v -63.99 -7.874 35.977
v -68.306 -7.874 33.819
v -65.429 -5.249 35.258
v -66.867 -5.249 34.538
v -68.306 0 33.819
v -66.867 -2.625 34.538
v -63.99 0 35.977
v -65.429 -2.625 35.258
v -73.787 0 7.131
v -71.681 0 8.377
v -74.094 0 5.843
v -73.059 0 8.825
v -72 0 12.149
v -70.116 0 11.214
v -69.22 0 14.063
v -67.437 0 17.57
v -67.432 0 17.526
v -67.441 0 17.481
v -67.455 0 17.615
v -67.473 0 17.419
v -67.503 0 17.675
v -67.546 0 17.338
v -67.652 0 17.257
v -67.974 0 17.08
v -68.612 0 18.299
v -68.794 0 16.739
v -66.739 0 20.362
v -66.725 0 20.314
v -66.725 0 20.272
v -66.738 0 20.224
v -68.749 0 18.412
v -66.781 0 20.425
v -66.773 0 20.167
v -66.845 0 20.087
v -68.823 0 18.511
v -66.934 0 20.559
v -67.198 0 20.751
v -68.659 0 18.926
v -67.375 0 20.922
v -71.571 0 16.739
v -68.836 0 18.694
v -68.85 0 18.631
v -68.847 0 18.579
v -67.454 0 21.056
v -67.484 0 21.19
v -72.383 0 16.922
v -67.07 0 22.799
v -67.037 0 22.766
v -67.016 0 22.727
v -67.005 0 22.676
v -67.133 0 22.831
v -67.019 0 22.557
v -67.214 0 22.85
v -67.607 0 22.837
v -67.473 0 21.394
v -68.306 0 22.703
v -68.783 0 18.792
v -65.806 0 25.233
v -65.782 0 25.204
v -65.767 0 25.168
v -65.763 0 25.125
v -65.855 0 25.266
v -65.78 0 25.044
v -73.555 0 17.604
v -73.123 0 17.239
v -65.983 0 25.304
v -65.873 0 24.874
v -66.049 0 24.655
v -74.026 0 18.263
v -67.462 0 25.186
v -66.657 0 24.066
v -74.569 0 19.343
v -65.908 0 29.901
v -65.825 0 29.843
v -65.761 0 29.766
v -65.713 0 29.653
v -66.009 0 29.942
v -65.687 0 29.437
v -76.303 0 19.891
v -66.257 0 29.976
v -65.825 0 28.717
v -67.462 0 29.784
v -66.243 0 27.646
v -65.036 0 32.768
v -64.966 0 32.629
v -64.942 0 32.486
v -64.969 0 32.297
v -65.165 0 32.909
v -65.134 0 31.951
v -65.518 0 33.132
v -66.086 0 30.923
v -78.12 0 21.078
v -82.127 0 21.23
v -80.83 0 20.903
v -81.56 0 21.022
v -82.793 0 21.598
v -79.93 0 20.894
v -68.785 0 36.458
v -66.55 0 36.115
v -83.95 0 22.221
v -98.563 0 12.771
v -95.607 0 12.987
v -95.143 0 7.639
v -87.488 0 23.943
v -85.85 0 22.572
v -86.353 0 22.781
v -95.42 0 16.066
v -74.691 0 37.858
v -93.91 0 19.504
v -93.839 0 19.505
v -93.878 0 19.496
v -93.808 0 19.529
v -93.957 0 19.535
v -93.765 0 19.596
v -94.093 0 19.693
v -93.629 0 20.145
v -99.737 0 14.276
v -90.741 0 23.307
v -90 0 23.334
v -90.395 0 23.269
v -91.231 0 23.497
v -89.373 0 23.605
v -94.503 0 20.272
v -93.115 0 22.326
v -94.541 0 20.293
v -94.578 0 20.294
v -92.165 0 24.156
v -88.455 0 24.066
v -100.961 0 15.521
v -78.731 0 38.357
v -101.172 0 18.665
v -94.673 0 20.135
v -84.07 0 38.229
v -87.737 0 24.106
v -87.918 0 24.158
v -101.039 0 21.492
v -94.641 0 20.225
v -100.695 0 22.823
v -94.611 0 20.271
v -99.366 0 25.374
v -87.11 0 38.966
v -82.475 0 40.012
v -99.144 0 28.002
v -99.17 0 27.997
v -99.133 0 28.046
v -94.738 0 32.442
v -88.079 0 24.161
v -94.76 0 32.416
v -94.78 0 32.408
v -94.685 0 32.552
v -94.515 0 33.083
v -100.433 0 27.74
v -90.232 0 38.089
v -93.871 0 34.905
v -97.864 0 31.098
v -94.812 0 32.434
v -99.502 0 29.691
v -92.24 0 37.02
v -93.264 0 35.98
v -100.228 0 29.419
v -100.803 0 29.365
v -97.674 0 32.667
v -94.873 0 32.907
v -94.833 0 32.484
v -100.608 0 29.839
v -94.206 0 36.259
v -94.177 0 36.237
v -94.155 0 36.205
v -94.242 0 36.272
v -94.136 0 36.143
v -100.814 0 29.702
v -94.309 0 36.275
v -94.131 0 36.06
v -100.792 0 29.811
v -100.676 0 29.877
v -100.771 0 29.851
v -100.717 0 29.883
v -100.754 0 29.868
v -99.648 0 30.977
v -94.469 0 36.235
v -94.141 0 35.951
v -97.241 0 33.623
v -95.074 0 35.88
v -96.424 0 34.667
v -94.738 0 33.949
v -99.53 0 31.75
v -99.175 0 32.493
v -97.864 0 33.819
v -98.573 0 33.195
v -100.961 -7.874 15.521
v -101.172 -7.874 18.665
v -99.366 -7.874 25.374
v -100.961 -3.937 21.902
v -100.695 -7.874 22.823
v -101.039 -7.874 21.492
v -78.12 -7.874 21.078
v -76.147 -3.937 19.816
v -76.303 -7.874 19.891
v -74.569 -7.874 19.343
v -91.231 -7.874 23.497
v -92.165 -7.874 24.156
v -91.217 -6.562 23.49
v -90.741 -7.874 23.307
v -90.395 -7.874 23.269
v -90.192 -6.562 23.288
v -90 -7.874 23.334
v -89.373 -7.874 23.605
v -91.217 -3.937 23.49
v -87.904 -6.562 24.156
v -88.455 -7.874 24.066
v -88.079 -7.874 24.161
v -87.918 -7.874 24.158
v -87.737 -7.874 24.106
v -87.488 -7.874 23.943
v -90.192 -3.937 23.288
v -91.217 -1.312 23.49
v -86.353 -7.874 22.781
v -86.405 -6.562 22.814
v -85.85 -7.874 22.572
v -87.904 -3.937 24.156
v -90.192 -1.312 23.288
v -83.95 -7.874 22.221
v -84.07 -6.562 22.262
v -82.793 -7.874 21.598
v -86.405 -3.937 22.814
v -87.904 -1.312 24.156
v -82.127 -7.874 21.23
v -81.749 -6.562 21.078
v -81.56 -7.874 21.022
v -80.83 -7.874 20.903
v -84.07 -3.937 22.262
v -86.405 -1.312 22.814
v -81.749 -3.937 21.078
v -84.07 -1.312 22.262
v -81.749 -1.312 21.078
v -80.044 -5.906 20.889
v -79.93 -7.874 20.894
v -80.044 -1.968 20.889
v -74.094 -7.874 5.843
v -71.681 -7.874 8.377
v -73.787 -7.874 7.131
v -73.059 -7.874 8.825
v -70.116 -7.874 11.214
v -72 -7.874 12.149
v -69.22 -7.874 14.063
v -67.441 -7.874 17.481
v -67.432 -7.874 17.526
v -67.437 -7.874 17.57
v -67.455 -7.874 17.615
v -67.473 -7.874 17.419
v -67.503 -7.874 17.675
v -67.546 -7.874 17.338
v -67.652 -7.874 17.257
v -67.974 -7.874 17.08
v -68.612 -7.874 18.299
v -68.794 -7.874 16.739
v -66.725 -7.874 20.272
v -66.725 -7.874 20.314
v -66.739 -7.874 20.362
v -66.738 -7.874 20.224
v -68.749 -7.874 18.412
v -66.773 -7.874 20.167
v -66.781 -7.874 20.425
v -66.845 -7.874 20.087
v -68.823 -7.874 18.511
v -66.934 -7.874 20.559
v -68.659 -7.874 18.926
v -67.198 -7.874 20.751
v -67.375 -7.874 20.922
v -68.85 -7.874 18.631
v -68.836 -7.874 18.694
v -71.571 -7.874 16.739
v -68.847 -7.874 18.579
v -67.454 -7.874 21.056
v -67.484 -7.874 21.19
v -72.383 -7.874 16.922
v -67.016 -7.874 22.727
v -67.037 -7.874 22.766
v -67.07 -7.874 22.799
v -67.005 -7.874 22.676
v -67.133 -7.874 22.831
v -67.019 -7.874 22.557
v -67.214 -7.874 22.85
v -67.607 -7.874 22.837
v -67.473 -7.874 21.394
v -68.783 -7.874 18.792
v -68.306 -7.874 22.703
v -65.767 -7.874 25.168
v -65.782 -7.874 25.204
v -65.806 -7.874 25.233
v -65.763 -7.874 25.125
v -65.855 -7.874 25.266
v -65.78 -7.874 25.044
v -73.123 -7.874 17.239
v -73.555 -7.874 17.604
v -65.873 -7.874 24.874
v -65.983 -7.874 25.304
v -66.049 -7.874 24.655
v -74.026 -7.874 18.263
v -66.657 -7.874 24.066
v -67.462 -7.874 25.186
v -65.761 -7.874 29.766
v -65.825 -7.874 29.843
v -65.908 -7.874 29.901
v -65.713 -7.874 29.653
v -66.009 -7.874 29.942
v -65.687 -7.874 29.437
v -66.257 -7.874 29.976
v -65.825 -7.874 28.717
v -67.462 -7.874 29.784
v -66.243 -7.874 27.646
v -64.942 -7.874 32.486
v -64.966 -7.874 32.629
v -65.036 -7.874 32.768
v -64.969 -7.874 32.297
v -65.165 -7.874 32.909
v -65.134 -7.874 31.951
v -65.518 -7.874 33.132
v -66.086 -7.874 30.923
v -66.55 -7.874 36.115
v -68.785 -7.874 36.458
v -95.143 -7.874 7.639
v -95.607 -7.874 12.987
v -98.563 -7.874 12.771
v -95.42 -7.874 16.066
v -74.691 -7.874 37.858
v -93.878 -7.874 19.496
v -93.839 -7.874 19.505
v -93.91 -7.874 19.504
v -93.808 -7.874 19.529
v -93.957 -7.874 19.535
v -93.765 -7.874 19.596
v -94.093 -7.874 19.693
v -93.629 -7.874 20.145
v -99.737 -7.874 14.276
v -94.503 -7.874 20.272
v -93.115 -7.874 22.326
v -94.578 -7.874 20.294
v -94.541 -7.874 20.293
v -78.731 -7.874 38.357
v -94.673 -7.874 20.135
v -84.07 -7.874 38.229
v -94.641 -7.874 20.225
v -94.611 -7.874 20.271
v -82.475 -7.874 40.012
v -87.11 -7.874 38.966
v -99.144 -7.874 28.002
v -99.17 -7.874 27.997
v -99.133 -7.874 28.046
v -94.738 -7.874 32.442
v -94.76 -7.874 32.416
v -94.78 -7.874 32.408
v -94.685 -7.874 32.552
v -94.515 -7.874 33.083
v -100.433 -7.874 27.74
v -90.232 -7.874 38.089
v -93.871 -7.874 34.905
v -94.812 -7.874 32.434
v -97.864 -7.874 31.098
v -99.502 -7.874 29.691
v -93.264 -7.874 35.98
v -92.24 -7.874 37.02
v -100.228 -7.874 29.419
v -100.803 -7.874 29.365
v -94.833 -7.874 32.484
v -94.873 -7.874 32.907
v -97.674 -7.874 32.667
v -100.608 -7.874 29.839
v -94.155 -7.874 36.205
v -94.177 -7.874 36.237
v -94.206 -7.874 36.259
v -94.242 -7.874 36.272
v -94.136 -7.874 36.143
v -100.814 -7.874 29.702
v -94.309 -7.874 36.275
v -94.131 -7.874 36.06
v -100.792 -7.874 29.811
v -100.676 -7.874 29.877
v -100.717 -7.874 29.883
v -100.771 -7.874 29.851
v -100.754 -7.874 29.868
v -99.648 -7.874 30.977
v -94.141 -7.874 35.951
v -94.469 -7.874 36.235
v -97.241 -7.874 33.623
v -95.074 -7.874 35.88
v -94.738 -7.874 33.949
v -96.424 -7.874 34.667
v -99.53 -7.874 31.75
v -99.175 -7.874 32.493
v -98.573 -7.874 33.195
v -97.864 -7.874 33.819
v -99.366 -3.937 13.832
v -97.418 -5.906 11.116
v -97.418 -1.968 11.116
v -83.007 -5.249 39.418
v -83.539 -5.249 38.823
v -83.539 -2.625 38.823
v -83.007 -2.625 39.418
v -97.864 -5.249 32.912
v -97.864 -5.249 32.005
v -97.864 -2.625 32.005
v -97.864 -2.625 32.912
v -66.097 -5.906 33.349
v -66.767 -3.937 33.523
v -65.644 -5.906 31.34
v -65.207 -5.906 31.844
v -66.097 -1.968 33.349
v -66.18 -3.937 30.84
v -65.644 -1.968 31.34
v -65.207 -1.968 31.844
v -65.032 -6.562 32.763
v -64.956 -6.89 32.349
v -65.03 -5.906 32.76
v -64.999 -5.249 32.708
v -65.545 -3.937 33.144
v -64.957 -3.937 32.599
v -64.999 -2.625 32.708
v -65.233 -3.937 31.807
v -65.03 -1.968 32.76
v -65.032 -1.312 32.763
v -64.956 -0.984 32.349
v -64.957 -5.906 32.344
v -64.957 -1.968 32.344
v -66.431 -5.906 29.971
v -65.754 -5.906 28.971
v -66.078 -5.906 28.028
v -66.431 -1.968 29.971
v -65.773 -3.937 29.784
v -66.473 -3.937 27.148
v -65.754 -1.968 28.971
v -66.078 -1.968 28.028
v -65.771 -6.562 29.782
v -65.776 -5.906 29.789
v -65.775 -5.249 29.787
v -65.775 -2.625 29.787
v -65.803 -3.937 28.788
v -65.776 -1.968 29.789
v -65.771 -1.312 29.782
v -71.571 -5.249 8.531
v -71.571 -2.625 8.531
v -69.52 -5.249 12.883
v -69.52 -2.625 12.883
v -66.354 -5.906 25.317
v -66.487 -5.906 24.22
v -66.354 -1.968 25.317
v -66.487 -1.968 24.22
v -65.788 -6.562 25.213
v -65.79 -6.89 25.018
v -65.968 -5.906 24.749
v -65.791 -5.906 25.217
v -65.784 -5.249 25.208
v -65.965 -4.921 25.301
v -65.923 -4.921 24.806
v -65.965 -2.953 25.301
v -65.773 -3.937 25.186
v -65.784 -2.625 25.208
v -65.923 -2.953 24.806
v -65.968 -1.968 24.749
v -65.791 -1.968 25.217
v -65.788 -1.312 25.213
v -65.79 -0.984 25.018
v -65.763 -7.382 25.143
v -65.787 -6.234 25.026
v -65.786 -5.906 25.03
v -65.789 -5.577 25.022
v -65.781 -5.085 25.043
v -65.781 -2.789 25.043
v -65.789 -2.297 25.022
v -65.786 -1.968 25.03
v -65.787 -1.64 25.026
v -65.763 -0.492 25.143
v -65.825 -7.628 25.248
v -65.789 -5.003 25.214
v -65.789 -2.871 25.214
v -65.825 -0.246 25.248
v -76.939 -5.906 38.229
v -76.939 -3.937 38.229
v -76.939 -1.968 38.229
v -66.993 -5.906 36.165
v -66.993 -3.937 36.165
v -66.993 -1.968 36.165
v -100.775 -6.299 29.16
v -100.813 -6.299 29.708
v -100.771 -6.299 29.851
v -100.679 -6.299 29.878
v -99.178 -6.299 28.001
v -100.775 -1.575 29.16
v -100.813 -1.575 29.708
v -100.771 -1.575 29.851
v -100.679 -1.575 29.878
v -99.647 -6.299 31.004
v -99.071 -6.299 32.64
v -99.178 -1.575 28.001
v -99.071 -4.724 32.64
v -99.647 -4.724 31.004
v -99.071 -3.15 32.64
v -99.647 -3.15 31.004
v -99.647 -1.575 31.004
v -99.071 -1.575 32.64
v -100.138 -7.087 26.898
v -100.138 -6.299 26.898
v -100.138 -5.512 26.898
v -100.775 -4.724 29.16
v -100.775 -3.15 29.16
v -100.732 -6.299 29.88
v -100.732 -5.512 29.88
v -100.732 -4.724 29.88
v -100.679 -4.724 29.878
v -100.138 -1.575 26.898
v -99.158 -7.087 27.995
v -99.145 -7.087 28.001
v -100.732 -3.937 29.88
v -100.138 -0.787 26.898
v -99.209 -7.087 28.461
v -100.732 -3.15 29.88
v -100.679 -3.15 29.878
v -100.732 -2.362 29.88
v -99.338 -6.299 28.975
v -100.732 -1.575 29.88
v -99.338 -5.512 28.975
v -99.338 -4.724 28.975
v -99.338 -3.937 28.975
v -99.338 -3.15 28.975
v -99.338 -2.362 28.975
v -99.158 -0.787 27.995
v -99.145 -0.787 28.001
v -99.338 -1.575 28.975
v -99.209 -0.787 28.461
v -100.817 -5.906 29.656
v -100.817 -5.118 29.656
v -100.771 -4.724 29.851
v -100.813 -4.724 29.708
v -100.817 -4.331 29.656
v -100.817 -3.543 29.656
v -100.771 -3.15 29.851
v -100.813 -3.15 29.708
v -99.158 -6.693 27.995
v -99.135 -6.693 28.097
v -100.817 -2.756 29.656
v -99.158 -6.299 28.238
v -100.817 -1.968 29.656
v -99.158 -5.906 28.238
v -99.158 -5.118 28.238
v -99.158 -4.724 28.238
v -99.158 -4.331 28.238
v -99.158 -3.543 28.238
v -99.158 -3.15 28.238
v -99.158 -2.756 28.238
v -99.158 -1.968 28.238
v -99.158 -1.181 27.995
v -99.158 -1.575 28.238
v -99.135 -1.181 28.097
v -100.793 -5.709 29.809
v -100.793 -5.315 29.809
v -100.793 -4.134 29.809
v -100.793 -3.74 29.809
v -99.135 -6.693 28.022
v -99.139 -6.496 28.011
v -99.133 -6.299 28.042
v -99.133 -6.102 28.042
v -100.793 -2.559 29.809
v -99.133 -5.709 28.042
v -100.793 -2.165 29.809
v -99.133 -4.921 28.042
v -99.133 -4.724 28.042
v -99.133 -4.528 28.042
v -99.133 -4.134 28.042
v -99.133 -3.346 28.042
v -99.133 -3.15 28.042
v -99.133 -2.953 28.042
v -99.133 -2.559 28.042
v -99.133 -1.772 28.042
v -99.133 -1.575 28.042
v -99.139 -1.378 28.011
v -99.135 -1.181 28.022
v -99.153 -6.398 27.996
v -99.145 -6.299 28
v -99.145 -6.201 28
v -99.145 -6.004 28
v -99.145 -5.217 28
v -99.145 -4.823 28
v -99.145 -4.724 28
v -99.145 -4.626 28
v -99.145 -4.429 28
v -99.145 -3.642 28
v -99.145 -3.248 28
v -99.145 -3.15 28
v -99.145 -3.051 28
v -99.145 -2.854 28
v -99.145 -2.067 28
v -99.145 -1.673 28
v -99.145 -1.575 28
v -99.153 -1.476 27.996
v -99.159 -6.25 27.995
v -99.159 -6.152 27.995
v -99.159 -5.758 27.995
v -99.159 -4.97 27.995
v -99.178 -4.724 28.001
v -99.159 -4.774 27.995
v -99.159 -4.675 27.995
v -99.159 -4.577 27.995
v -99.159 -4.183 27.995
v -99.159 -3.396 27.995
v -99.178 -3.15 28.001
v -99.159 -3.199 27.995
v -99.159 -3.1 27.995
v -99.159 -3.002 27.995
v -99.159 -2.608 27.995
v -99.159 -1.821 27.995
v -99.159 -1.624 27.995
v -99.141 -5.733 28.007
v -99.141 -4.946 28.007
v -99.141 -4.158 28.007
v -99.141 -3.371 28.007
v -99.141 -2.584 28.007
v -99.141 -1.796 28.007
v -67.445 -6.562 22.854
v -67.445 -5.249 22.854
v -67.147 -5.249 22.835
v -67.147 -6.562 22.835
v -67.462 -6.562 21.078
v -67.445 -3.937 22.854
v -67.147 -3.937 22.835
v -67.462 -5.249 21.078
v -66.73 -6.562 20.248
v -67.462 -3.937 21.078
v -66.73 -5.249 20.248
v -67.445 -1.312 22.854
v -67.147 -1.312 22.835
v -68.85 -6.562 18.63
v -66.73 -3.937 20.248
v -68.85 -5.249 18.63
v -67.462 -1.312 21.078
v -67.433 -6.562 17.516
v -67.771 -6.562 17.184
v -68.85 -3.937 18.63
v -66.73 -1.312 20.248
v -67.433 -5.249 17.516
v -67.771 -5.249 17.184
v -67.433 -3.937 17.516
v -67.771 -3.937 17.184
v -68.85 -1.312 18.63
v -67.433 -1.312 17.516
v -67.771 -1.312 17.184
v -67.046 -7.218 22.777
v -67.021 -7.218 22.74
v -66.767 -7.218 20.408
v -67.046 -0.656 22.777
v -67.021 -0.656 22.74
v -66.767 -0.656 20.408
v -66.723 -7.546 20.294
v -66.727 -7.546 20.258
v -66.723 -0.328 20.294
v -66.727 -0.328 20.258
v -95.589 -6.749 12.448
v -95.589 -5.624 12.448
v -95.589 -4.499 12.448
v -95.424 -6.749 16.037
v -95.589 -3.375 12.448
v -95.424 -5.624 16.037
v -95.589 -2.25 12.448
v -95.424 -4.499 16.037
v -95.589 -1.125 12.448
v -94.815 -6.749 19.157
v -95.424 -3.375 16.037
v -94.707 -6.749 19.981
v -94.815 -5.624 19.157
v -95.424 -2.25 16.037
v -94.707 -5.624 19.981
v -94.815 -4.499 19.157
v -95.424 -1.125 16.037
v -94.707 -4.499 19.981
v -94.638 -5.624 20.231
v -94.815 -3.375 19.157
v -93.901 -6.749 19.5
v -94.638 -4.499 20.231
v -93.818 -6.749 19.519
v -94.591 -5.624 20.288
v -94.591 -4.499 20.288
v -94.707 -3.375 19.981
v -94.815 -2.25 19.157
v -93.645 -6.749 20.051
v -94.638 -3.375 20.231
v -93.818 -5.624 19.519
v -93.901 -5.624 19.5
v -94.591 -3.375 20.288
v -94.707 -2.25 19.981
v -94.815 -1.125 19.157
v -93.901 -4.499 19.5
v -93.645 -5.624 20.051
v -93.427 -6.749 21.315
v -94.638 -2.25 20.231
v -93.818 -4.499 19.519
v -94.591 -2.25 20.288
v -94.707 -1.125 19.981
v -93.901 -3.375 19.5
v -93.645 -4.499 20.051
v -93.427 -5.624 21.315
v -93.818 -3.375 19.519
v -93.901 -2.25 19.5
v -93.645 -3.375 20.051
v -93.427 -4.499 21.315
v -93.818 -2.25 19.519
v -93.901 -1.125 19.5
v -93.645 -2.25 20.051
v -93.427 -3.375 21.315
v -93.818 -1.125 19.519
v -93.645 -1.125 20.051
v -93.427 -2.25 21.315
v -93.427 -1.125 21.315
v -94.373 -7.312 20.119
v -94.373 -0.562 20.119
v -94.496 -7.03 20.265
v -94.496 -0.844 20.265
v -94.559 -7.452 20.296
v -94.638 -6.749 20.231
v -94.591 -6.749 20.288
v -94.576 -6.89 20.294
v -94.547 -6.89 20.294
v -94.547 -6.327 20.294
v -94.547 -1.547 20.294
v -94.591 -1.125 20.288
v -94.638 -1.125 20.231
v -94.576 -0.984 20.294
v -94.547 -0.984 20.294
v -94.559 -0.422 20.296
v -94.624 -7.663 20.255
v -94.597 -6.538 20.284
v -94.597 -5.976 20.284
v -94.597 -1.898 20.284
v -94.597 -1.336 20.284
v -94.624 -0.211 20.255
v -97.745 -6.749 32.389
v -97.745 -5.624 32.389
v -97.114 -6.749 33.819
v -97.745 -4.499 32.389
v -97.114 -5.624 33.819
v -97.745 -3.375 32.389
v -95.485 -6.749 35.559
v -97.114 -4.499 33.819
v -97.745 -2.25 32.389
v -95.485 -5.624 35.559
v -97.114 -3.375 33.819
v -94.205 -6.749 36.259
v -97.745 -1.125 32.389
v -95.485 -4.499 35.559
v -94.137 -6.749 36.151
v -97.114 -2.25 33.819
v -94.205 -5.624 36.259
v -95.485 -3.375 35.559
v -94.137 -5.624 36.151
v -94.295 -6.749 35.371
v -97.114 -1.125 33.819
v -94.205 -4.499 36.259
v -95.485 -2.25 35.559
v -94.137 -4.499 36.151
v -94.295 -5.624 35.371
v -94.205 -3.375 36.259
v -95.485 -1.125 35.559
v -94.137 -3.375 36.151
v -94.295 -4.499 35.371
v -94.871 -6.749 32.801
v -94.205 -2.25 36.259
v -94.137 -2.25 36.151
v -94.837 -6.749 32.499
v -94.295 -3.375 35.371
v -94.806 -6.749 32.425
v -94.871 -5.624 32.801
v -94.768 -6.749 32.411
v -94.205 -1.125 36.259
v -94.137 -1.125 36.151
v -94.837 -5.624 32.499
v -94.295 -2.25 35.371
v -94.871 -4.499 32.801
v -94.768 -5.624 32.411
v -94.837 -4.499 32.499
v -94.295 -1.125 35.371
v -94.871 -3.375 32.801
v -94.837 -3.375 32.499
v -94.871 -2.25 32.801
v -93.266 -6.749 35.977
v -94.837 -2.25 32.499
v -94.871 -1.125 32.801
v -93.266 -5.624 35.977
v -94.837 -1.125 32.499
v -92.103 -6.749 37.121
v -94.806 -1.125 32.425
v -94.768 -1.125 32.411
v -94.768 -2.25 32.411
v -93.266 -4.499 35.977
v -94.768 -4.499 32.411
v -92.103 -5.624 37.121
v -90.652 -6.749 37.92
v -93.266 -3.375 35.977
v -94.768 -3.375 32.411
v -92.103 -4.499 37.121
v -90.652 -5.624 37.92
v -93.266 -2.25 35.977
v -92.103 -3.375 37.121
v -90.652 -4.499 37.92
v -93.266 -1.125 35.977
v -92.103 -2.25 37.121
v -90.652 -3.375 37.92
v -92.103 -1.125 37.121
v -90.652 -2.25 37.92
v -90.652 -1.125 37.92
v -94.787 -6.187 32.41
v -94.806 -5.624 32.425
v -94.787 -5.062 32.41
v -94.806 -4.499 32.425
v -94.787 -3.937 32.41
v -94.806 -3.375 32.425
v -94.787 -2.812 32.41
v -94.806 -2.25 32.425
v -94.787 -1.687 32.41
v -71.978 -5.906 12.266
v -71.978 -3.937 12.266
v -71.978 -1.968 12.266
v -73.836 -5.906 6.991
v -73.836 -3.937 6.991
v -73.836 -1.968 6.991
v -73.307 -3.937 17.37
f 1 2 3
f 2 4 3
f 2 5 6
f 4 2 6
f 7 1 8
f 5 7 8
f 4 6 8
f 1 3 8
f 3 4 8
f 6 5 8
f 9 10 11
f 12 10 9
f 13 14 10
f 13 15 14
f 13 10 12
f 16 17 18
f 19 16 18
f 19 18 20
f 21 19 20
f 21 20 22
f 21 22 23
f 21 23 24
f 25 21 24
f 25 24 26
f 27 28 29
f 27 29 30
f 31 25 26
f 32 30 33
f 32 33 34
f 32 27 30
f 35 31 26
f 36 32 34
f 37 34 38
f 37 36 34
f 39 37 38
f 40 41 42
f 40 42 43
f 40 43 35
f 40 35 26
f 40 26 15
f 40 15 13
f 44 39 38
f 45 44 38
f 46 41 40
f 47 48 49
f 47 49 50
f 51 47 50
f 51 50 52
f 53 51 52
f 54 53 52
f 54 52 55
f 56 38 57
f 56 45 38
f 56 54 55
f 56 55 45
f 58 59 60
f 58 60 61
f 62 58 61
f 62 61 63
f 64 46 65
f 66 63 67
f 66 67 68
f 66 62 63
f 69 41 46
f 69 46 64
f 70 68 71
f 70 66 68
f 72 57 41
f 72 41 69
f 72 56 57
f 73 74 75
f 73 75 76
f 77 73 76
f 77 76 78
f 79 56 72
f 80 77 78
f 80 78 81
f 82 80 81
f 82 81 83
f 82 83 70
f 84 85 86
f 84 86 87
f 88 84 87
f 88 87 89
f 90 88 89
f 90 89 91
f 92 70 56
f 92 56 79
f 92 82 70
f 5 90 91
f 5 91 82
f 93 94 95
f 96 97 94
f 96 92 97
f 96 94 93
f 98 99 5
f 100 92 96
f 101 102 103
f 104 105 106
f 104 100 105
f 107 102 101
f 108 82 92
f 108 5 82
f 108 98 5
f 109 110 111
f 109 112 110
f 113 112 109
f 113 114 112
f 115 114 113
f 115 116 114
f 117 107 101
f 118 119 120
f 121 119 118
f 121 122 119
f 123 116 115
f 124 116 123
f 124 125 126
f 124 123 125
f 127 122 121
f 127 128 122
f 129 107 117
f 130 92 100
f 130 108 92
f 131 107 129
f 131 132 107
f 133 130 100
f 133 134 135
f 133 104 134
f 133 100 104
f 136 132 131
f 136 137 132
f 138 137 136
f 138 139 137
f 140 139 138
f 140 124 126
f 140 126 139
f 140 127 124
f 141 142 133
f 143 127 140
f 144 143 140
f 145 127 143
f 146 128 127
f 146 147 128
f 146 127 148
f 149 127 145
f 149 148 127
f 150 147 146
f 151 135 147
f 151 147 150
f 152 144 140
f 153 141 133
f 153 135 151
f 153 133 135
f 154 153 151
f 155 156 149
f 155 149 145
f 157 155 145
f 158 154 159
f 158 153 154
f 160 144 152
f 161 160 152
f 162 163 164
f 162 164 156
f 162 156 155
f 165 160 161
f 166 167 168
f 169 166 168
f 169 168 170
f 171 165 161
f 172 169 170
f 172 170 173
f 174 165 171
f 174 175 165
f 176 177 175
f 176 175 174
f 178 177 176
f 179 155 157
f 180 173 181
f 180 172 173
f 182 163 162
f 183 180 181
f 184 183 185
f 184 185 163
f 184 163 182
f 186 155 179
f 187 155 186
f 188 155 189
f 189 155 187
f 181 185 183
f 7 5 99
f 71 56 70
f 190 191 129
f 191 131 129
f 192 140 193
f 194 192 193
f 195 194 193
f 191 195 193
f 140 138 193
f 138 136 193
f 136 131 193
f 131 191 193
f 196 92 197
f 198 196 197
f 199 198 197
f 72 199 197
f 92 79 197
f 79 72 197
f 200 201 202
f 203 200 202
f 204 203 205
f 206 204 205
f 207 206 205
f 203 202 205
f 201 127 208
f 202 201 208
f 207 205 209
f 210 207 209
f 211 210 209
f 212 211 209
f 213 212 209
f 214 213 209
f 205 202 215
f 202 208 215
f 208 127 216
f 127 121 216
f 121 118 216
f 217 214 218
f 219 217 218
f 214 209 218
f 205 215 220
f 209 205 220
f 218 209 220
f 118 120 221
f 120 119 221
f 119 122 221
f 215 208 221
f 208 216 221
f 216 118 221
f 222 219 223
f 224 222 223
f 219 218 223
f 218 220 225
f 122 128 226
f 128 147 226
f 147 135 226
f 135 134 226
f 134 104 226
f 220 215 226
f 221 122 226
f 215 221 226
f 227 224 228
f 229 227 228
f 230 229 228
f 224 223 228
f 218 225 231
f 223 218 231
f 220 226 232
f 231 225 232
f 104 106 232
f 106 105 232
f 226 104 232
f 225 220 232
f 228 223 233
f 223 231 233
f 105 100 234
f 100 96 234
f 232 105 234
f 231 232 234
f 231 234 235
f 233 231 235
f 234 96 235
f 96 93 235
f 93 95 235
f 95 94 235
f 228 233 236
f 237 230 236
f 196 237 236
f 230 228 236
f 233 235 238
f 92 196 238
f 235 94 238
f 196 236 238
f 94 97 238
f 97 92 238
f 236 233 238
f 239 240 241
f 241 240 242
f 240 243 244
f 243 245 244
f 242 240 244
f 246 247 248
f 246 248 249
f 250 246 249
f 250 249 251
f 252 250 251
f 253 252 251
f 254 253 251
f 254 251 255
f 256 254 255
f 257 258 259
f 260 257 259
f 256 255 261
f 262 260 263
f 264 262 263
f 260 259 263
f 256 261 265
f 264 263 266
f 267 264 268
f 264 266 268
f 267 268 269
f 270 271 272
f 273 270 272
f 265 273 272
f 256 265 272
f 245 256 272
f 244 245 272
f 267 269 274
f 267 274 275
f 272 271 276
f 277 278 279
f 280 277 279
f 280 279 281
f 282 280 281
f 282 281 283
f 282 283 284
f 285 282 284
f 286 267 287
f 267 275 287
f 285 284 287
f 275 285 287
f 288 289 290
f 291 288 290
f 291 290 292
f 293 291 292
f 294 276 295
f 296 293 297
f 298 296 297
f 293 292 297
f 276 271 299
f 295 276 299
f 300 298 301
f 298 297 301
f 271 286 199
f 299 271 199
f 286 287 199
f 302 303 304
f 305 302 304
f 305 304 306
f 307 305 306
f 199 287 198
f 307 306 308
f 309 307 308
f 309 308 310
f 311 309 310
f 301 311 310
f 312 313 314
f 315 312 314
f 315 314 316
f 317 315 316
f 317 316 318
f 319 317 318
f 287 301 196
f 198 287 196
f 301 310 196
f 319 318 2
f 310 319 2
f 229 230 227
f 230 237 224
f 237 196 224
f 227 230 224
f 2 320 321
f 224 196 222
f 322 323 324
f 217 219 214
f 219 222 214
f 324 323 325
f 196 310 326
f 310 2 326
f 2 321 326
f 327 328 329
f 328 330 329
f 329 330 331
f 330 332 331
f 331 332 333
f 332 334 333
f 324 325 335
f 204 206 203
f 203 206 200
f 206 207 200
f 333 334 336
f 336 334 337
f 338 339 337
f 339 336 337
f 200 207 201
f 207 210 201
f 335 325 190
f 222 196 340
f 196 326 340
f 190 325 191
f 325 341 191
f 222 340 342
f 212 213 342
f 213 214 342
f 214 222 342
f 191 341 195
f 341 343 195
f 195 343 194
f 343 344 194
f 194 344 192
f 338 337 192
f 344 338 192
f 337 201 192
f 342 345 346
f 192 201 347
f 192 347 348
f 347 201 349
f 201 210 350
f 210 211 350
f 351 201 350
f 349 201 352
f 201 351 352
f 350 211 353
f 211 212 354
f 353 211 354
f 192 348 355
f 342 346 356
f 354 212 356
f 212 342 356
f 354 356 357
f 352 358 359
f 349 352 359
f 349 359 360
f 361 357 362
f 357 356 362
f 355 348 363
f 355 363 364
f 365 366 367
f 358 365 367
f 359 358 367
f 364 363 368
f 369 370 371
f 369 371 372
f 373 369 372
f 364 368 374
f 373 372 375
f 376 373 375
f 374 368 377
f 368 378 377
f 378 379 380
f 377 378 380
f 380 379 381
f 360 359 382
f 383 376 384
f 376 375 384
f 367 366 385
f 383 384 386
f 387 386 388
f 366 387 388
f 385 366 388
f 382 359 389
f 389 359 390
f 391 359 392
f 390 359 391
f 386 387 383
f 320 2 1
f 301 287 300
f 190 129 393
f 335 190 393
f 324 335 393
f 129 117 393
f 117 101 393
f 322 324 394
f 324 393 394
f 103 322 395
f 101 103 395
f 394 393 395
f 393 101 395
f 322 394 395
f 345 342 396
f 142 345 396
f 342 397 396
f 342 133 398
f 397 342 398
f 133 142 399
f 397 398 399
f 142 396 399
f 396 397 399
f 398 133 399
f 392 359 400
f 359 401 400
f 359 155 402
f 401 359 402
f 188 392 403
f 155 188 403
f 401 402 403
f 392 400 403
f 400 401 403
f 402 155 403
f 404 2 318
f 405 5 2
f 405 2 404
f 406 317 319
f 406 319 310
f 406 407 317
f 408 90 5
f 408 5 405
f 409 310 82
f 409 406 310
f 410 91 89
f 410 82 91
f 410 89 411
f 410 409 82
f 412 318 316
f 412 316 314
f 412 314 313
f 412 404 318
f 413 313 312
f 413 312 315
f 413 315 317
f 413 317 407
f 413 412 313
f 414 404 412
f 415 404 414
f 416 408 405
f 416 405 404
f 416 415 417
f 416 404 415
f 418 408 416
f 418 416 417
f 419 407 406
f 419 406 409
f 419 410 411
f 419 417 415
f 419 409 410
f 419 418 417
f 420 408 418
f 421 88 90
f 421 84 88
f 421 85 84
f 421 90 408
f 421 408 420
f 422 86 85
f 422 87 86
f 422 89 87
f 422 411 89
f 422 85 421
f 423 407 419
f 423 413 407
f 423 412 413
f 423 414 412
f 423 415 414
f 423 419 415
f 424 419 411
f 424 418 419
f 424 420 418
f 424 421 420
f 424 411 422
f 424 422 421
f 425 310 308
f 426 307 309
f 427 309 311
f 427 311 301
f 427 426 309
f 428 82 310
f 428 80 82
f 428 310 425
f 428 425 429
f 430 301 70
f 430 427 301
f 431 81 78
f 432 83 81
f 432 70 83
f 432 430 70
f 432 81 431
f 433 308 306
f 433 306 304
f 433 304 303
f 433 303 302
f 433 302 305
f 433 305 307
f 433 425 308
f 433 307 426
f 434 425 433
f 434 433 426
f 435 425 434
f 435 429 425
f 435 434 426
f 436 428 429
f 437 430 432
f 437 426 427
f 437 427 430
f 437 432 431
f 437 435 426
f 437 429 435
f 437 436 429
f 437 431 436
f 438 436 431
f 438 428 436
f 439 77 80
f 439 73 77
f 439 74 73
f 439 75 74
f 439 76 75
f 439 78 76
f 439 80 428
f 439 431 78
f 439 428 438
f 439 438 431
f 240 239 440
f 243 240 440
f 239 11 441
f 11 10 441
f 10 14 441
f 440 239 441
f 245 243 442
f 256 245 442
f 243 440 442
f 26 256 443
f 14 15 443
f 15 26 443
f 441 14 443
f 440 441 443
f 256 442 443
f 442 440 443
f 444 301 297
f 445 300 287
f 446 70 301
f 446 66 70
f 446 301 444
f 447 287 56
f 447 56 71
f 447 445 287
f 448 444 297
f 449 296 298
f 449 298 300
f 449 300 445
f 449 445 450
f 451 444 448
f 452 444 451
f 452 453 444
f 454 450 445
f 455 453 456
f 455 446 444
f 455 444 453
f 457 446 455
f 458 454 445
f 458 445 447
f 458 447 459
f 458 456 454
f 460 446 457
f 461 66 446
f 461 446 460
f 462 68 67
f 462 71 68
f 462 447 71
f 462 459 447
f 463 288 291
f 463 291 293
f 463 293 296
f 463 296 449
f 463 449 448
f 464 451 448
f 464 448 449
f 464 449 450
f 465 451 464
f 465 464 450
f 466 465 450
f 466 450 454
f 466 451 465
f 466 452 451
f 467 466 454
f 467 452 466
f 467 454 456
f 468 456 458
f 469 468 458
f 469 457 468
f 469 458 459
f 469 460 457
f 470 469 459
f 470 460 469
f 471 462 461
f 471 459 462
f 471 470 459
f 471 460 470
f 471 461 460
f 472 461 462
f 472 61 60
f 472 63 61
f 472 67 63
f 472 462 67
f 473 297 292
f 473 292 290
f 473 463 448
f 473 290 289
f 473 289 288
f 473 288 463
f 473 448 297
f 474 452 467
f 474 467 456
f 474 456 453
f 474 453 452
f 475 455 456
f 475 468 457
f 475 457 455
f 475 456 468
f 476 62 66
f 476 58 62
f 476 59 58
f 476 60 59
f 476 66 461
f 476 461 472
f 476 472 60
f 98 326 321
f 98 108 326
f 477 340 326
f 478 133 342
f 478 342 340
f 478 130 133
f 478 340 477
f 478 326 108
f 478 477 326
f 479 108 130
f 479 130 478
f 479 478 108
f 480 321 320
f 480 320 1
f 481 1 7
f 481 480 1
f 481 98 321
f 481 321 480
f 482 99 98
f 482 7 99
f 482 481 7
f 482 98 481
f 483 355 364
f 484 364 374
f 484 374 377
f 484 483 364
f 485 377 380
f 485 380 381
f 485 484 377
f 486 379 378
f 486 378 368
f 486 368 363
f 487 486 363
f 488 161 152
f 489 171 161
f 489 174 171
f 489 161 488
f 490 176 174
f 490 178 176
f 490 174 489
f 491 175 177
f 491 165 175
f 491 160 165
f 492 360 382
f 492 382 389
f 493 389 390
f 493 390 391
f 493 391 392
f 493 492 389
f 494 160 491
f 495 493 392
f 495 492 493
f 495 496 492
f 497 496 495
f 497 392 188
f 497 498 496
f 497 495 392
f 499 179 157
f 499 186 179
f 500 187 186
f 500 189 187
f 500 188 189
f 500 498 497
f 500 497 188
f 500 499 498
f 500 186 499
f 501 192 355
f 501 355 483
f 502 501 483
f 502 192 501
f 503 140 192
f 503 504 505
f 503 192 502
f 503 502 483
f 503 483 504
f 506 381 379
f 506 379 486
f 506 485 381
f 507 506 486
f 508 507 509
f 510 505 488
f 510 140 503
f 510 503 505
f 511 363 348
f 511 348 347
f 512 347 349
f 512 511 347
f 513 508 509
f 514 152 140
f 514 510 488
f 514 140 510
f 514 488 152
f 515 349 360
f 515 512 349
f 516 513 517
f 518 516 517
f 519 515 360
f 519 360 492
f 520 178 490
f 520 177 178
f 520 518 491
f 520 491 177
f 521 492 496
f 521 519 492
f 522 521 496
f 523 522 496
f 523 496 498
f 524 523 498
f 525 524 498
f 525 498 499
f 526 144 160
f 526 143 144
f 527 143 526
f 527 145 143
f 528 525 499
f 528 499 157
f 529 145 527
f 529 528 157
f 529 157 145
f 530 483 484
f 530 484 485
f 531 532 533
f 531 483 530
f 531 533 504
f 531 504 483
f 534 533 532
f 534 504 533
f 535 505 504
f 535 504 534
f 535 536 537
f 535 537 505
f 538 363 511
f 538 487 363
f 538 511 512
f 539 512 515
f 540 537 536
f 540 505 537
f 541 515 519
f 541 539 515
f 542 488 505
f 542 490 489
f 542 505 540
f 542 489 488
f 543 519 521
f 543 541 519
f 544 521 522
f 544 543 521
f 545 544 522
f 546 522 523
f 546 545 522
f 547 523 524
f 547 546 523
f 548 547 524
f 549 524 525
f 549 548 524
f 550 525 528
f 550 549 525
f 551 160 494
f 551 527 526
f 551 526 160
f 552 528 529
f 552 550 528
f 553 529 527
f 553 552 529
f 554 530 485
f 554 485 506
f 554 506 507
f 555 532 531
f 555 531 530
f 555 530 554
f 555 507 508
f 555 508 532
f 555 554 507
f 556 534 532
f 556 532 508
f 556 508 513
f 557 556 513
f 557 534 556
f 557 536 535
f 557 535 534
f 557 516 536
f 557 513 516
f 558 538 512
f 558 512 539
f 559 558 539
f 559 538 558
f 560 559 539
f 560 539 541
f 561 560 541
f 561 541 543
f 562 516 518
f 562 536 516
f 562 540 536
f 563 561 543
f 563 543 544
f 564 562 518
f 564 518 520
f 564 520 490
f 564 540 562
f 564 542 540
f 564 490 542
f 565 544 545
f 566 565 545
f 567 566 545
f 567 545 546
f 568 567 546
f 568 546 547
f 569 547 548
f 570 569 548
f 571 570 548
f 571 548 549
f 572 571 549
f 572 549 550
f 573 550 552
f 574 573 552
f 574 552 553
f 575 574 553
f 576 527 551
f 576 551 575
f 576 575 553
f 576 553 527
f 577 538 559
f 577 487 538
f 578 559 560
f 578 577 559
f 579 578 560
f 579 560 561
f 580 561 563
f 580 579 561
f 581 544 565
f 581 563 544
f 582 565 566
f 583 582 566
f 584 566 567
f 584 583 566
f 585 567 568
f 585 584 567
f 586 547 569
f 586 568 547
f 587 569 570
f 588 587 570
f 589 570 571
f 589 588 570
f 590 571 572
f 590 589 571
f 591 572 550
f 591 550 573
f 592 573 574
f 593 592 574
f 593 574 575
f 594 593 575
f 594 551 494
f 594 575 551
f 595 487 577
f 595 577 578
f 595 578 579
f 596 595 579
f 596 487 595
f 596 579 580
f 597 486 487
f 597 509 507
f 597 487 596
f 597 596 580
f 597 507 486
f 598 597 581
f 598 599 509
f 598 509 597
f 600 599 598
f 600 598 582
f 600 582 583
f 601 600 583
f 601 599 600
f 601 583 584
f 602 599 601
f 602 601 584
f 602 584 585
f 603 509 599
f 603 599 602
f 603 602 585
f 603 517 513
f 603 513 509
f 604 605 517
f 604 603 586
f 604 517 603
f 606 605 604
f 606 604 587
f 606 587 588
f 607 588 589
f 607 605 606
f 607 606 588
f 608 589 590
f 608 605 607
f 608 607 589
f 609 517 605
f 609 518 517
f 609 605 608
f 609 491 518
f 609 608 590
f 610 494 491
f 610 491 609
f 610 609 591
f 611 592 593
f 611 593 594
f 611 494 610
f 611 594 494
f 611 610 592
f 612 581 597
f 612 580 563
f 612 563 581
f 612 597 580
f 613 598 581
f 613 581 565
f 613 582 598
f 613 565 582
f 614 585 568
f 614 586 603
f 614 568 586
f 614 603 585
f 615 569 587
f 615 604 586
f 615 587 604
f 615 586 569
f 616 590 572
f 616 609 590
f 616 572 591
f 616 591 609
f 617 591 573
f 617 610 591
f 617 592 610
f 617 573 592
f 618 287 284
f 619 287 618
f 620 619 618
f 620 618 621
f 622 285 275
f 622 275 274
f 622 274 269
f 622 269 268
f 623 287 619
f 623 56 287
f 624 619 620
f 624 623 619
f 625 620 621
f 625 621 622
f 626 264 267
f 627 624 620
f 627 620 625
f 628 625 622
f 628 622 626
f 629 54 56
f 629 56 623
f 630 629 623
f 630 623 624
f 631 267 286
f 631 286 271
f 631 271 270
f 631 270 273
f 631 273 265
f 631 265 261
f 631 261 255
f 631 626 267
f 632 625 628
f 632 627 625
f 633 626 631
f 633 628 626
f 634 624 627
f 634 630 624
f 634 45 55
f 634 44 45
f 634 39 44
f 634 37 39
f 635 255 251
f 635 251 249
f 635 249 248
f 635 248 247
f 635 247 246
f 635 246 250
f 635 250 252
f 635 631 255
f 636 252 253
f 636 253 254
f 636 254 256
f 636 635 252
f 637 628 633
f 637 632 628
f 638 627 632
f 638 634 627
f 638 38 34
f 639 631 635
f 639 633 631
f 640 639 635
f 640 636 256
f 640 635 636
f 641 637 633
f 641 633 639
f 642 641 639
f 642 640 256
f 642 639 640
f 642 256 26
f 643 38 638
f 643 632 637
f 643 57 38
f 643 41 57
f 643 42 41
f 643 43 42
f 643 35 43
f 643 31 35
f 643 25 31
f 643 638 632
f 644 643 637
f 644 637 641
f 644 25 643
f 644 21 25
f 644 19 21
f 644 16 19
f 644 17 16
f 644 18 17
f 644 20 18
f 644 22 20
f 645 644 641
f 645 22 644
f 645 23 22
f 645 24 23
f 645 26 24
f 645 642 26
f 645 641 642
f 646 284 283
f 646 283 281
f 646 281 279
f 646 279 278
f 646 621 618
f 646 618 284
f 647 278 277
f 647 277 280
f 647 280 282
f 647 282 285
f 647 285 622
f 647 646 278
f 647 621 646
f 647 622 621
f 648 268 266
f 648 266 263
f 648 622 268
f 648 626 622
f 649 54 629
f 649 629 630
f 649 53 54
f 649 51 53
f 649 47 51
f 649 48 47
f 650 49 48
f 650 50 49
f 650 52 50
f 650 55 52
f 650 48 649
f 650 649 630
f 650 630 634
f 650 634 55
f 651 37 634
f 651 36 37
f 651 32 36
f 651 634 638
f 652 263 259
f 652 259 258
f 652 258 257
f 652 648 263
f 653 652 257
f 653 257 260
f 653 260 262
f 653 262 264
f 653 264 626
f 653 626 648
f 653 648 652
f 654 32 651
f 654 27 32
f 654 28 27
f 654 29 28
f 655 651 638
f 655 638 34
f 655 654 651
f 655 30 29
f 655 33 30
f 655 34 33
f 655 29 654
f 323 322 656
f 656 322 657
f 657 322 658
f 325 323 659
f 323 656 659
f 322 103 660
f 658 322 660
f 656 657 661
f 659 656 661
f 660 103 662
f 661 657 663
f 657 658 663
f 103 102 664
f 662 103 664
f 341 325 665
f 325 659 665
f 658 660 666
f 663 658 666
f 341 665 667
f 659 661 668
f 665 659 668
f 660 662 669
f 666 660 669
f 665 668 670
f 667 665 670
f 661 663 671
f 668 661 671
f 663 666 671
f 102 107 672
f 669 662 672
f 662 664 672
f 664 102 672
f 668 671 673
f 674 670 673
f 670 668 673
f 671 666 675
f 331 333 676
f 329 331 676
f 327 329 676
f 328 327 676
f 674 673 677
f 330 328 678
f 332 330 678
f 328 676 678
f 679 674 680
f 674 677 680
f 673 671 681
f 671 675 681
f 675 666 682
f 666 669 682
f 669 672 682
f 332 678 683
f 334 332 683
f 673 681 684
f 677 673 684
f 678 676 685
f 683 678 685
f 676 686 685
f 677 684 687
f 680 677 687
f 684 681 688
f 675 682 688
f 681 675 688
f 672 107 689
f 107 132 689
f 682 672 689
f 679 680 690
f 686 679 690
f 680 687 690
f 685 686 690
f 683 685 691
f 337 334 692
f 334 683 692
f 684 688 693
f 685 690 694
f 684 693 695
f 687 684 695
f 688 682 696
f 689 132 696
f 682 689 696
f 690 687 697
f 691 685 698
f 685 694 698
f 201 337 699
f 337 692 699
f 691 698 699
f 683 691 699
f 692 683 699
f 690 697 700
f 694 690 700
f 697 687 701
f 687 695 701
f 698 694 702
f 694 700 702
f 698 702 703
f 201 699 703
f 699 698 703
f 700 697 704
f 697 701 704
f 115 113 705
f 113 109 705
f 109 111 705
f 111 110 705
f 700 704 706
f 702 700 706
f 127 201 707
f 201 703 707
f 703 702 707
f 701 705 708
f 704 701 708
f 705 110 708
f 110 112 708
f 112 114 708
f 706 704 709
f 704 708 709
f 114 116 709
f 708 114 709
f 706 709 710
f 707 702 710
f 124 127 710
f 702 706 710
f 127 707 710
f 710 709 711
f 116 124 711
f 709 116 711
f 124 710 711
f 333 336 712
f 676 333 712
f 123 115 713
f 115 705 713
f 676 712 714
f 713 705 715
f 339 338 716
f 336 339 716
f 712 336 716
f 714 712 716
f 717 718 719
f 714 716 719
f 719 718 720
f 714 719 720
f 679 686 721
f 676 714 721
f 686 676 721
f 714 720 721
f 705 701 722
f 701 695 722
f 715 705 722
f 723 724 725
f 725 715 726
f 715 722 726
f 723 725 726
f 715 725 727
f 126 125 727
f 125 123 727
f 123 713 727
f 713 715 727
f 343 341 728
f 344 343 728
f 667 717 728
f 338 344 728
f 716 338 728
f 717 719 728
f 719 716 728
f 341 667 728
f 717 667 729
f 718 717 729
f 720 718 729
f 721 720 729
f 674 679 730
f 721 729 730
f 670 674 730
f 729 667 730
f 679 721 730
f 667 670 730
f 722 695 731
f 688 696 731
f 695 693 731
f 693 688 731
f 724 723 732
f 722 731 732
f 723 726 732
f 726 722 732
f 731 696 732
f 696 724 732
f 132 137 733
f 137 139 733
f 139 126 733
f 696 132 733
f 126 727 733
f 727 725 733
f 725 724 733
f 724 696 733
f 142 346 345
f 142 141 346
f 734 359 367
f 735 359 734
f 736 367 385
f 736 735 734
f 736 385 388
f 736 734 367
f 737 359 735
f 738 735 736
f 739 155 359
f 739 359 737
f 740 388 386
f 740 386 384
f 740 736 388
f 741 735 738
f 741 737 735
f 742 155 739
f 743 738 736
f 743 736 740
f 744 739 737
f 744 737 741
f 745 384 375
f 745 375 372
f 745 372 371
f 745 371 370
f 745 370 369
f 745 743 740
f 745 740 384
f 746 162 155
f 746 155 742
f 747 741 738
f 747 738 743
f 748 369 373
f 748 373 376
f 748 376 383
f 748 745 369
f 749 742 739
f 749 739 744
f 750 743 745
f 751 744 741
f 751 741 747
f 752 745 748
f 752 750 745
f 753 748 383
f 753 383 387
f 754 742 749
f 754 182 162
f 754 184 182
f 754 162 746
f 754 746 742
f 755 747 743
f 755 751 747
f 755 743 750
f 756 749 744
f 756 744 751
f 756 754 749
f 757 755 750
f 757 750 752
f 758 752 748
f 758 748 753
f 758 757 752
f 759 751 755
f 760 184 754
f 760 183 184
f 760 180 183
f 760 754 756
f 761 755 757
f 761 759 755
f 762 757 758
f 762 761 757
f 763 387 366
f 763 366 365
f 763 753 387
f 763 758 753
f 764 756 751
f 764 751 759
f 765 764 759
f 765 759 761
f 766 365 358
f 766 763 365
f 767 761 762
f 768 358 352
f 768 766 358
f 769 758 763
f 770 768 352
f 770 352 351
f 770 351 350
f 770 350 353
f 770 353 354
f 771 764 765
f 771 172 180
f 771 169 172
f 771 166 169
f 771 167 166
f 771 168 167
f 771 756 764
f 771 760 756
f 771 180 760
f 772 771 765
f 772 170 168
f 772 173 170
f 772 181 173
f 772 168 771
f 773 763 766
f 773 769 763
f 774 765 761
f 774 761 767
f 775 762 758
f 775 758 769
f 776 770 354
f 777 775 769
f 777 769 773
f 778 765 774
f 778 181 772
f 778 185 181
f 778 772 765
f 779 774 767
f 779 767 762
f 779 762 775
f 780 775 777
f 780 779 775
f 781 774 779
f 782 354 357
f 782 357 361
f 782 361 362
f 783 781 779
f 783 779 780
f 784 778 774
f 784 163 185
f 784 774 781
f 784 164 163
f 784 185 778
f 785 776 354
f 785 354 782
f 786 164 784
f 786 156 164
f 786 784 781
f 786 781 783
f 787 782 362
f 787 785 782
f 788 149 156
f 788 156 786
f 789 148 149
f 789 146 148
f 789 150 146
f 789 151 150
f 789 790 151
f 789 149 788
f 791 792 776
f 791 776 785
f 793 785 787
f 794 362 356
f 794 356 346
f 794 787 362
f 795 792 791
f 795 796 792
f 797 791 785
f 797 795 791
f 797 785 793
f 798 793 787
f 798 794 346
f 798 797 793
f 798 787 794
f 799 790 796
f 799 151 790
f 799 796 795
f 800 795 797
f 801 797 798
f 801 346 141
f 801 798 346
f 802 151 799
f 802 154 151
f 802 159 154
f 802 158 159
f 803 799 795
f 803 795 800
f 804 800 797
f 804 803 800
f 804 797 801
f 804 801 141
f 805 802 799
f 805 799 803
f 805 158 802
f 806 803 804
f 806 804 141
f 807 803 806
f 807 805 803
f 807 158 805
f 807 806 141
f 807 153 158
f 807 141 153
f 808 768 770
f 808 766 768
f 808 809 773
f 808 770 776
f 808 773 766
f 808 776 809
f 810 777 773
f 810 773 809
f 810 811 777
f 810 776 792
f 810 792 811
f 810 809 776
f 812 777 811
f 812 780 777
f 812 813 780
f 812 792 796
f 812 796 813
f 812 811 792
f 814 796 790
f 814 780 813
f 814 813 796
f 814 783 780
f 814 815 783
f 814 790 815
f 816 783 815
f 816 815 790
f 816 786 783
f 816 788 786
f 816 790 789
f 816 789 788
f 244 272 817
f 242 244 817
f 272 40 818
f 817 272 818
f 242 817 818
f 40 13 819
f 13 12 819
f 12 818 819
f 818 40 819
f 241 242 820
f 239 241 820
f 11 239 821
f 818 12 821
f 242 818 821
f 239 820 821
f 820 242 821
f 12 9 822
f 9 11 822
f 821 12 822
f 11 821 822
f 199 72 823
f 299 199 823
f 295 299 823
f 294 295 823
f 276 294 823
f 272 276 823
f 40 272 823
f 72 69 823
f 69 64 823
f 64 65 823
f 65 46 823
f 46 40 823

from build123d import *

# Parameters (mm, degrees)
F1_DEPTH = 7.874


with BuildPart() as f1:
    # F0 (on Front) → F1 (new body)
    with BuildSketch(Plane.XZ):
        with BuildLine():
            add(Edge.make_bspline(
                [(-99.3655622005, 25.3736991435), (-99.7186079425, 25.9849450713), (-100.4095720668, 27.1812461651), (-101.2930539888, 31.3882195194), (-98.2945495239, 26.2409821445), (-100.4476592805, 31.6469396337), (-98.7384615482, 33.0838480133), (-97.864203155, 33.8188298047)],
                knots=[0, 0, 0, 0, 0.1919575518, 0.3756900762, 0.5647603496, 0.7773739631, 1, 1, 1, 1], degree=3))
            add(Edge.make_bspline(
                [(-99.3655622005, 25.3736991435), (-100.0132753914, 24.3229709329), (-101.4980187016, 21.9144022893), (-101.1544449609, 17.8259362004), (-100.9607538581, 15.5210467055)],
                knots=[0, 0, 0, 0, 0.4362459062, 1, 1, 1, 1], degree=3))
            add(Edge.make_bspline(
                [(-100.9607538581, 15.5210467055), (-100.4740620901, 15.0628732588), (-99.1131697527, 13.7817241335), (-96.6958310505, 10.0415276176), (-95.1429978013, 7.6389261521)],
                knots=[0, 0, 0, 0, 0.3576269442, 1, 1, 1, 1], degree=3))
            add(Edge.make_bspline(
                [(-95.1429978013, 7.6389261521), (-95.3334632568, 9.2968706401), (-95.6882082283, 12.3848188919), (-95.5715488401, 15.9971678292), (-94.7715010539, 18.7803615904), (-94.6828212472, 20.9236480055), (-93.6839967088, 18.6650899521), (-93.573093741, 21.766880784), (-92.6720992878, 23.295456774), (-92.1650007367, 24.1557713598)],
                knots=[0, 0, 0, 0, 0.1980889695, 0.3689438889, 0.5296574507, 0.6270283815, 0.7176364267, 0.8410798663, 1, 1, 1, 1], degree=3))
            add(Edge.make_bspline(
                [(-92.1650007367, 24.1557713598), (-91.5416413772, 23.6599942204), (-90.2540075189, 22.6358988555), (-87.721873428, 25.0116694584), (-86.6092124754, 22.2729142516), (-83.8873526604, 22.6300329458), (-81.8408712751, 20.6000784457), (-79.4267475279, 20.9104458975), (-78.1198590994, 21.0784636438)],
                knots=[0, 0, 0, 0, 0.1542239042, 0.3185705288, 0.4675738109, 0.6302852175, 0.7998545138, 1, 1, 1, 1], degree=3))
            add(Edge.make_bspline(
                [(-78.1198590994, 21.0784636438), (-77.4540540867, 20.5943651335), (-76.2298116593, 19.7042337527), (-75.0893393023, 19.4558481976), (-74.5691135526, 19.3425472826)],
                knots=[0, 0, 0, 0, 0.5438506277, 1, 1, 1, 1], degree=3))
            add(Edge.make_bspline(
                [(-74.5691135526, 19.3425472826), (-74.2093877038, 18.5736159104), (-73.5301978659, 17.1218148349), (-72.197544255, 16.861237203), (-71.5707167983, 16.7386718094)],
                knots=[0, 0, 0, 0, 0.5296396216, 1, 1, 1, 1], degree=3))
            add(Edge.make_bspline(
                [(-71.5707167983, 16.7386718094), (-71.6510979271, 15.1790395667), (-71.7995646494, 12.2983449261), (-72.7956620423, 9.2642161377), (-73.9001602017, 7.0672689467), (-74.0375542083, 6.2010264767), (-74.0942880511, 5.8433306403)],
                knots=[0, 0, 0, 0, 0.3239754008, 0.5983937592, 0.8341655077, 1, 1, 1, 1], degree=3))
            add(Edge.make_bspline(
                [(-74.0942880511, 5.8433306403), (-73.2162015208, 6.6436990205), (-71.3350039849, 8.3583945232), (-69.3006153942, 12.8459435708), (-68.9571976772, 15.4859221523), (-68.7942355871, 16.7386718094)],
                knots=[0, 0, 0, 0, 0.315057671, 0.6749741555, 1, 1, 1, 1], degree=3))
            add(Edge.make_bspline(
                [(-68.3062523603, 22.7025859058), (-67.6845067557, 22.8372767723), (-66.3539844307, 23.1255123521), (-68.1717779682, 20.8889096751), (-65.5907157134, 20.2650706615), (-70.3923916114, 18.5894592597), (-66.4833691472, 17.6418325194), (-68.0327508594, 17.0362844604), (-68.7942355871, 16.7386718094)],
                knots=[0, 0, 0, 0, 0.1479862311, 0.3166873762, 0.4533961697, 0.6655711315, 0.8356360645, 1, 1, 1, 1], degree=3))
            add(Edge.make_bspline(
                [(-67.4617365003, 25.1860301942), (-66.6648418163, 25.3026320171), (-64.7130117494, 25.5882242648), (-66.970470568, 23.7753176253), (-68.3062523603, 22.7025859058)],
                knots=[0, 0, 0, 0, 0.4082807707, 1, 1, 1, 1], degree=3))
            add(Edge.make_bspline(
                [(-67.4617365003, 29.7839324921), (-66.7334260158, 29.9504127404), (-64.7648289171, 30.400402876), (-66.4193371258, 27.2014714558), (-67.4617365003, 25.1860301942)],
                knots=[0, 0, 0, 0, 0.3699642171, 1, 1, 1, 1], degree=3))
            add(Edge.make_bspline(
                [(-68.3062523603, 33.8188298047), (-66.7143672404, 33.5369644734), (-63.48577882, 32.9652981308), (-66.1242086744, 30.8541564251), (-67.4617365003, 29.7839324921)],
                knots=[0, 0, 0, 0, 0.4930591679, 1, 1, 1, 1], degree=3))
            add(Edge.make_bspline(
                [(-68.3062523603, 33.8188298047), (-66.8674508731, 34.5382293065), (-65.4286493858, 35.2576288084), (-63.9898478985, 35.9770283103)],
                knots=[0, 0, 0, 0, 4.8258852316, 4.8258852316, 4.8258852316, 4.8258852316], degree=3))
            add(Edge.make_bspline(
                [(-84.0704888105, 38.2290631533), (-81.6349296493, 38.3565872575), (-76.9929966741, 38.5996354881), (-71.3545323935, 36.9855078159), (-67.0809444322, 36.0663838719), (-64.9569122247, 36.0049836249), (-63.9898478985, 35.9770283103)],
                knots=[0, 0, 0, 0, 0.3000763537, 0.5719156174, 0.8050946998, 1, 1, 1, 1], degree=3))
            add(Edge.make_bspline(
                [(-84.0704888105, 38.2290631533), (-83.538758258, 38.8233500222), (-83.0070277055, 39.4176368912), (-82.475297153, 40.0119237602)],
                knots=[0, 0, 0, 0, 2.3923269776, 2.3923269776, 2.3923269776, 2.3923269776], degree=3))
            add(Edge.make_bspline(
                [(-97.864203155, 31.0976207256), (-97.8417216214, 31.9435399045), (-97.7931679915, 33.770481402), (-93.1469084996, 37.6229334342), (-95.0133940493, 33.9372070268), (-94.7798622132, 31.237248278), (-93.8507090221, 37.301266744), (-87.3718141015, 38.9357050974), (-84.0399671356, 39.6680207258), (-82.475297153, 40.0119237602)],
                knots=[0, 0, 0, 0, 0.127545699, 0.2754619309, 0.3955842031, 0.4856478387, 0.6349670858, 0.8285767476, 1, 1, 1, 1], degree=3))
            add(Edge.make_bspline(
                [(-97.864203155, 31.0976207256), (-97.864203155, 32.0046904186), (-97.864203155, 32.9117601116), (-97.864203155, 33.8188298047)],
                knots=[0, 0, 0, 0, 2.721209079, 2.721209079, 2.721209079, 2.721209079], degree=3))
        make_face()
    extrude(amount=F1_DEPTH)


solid = f1.part
